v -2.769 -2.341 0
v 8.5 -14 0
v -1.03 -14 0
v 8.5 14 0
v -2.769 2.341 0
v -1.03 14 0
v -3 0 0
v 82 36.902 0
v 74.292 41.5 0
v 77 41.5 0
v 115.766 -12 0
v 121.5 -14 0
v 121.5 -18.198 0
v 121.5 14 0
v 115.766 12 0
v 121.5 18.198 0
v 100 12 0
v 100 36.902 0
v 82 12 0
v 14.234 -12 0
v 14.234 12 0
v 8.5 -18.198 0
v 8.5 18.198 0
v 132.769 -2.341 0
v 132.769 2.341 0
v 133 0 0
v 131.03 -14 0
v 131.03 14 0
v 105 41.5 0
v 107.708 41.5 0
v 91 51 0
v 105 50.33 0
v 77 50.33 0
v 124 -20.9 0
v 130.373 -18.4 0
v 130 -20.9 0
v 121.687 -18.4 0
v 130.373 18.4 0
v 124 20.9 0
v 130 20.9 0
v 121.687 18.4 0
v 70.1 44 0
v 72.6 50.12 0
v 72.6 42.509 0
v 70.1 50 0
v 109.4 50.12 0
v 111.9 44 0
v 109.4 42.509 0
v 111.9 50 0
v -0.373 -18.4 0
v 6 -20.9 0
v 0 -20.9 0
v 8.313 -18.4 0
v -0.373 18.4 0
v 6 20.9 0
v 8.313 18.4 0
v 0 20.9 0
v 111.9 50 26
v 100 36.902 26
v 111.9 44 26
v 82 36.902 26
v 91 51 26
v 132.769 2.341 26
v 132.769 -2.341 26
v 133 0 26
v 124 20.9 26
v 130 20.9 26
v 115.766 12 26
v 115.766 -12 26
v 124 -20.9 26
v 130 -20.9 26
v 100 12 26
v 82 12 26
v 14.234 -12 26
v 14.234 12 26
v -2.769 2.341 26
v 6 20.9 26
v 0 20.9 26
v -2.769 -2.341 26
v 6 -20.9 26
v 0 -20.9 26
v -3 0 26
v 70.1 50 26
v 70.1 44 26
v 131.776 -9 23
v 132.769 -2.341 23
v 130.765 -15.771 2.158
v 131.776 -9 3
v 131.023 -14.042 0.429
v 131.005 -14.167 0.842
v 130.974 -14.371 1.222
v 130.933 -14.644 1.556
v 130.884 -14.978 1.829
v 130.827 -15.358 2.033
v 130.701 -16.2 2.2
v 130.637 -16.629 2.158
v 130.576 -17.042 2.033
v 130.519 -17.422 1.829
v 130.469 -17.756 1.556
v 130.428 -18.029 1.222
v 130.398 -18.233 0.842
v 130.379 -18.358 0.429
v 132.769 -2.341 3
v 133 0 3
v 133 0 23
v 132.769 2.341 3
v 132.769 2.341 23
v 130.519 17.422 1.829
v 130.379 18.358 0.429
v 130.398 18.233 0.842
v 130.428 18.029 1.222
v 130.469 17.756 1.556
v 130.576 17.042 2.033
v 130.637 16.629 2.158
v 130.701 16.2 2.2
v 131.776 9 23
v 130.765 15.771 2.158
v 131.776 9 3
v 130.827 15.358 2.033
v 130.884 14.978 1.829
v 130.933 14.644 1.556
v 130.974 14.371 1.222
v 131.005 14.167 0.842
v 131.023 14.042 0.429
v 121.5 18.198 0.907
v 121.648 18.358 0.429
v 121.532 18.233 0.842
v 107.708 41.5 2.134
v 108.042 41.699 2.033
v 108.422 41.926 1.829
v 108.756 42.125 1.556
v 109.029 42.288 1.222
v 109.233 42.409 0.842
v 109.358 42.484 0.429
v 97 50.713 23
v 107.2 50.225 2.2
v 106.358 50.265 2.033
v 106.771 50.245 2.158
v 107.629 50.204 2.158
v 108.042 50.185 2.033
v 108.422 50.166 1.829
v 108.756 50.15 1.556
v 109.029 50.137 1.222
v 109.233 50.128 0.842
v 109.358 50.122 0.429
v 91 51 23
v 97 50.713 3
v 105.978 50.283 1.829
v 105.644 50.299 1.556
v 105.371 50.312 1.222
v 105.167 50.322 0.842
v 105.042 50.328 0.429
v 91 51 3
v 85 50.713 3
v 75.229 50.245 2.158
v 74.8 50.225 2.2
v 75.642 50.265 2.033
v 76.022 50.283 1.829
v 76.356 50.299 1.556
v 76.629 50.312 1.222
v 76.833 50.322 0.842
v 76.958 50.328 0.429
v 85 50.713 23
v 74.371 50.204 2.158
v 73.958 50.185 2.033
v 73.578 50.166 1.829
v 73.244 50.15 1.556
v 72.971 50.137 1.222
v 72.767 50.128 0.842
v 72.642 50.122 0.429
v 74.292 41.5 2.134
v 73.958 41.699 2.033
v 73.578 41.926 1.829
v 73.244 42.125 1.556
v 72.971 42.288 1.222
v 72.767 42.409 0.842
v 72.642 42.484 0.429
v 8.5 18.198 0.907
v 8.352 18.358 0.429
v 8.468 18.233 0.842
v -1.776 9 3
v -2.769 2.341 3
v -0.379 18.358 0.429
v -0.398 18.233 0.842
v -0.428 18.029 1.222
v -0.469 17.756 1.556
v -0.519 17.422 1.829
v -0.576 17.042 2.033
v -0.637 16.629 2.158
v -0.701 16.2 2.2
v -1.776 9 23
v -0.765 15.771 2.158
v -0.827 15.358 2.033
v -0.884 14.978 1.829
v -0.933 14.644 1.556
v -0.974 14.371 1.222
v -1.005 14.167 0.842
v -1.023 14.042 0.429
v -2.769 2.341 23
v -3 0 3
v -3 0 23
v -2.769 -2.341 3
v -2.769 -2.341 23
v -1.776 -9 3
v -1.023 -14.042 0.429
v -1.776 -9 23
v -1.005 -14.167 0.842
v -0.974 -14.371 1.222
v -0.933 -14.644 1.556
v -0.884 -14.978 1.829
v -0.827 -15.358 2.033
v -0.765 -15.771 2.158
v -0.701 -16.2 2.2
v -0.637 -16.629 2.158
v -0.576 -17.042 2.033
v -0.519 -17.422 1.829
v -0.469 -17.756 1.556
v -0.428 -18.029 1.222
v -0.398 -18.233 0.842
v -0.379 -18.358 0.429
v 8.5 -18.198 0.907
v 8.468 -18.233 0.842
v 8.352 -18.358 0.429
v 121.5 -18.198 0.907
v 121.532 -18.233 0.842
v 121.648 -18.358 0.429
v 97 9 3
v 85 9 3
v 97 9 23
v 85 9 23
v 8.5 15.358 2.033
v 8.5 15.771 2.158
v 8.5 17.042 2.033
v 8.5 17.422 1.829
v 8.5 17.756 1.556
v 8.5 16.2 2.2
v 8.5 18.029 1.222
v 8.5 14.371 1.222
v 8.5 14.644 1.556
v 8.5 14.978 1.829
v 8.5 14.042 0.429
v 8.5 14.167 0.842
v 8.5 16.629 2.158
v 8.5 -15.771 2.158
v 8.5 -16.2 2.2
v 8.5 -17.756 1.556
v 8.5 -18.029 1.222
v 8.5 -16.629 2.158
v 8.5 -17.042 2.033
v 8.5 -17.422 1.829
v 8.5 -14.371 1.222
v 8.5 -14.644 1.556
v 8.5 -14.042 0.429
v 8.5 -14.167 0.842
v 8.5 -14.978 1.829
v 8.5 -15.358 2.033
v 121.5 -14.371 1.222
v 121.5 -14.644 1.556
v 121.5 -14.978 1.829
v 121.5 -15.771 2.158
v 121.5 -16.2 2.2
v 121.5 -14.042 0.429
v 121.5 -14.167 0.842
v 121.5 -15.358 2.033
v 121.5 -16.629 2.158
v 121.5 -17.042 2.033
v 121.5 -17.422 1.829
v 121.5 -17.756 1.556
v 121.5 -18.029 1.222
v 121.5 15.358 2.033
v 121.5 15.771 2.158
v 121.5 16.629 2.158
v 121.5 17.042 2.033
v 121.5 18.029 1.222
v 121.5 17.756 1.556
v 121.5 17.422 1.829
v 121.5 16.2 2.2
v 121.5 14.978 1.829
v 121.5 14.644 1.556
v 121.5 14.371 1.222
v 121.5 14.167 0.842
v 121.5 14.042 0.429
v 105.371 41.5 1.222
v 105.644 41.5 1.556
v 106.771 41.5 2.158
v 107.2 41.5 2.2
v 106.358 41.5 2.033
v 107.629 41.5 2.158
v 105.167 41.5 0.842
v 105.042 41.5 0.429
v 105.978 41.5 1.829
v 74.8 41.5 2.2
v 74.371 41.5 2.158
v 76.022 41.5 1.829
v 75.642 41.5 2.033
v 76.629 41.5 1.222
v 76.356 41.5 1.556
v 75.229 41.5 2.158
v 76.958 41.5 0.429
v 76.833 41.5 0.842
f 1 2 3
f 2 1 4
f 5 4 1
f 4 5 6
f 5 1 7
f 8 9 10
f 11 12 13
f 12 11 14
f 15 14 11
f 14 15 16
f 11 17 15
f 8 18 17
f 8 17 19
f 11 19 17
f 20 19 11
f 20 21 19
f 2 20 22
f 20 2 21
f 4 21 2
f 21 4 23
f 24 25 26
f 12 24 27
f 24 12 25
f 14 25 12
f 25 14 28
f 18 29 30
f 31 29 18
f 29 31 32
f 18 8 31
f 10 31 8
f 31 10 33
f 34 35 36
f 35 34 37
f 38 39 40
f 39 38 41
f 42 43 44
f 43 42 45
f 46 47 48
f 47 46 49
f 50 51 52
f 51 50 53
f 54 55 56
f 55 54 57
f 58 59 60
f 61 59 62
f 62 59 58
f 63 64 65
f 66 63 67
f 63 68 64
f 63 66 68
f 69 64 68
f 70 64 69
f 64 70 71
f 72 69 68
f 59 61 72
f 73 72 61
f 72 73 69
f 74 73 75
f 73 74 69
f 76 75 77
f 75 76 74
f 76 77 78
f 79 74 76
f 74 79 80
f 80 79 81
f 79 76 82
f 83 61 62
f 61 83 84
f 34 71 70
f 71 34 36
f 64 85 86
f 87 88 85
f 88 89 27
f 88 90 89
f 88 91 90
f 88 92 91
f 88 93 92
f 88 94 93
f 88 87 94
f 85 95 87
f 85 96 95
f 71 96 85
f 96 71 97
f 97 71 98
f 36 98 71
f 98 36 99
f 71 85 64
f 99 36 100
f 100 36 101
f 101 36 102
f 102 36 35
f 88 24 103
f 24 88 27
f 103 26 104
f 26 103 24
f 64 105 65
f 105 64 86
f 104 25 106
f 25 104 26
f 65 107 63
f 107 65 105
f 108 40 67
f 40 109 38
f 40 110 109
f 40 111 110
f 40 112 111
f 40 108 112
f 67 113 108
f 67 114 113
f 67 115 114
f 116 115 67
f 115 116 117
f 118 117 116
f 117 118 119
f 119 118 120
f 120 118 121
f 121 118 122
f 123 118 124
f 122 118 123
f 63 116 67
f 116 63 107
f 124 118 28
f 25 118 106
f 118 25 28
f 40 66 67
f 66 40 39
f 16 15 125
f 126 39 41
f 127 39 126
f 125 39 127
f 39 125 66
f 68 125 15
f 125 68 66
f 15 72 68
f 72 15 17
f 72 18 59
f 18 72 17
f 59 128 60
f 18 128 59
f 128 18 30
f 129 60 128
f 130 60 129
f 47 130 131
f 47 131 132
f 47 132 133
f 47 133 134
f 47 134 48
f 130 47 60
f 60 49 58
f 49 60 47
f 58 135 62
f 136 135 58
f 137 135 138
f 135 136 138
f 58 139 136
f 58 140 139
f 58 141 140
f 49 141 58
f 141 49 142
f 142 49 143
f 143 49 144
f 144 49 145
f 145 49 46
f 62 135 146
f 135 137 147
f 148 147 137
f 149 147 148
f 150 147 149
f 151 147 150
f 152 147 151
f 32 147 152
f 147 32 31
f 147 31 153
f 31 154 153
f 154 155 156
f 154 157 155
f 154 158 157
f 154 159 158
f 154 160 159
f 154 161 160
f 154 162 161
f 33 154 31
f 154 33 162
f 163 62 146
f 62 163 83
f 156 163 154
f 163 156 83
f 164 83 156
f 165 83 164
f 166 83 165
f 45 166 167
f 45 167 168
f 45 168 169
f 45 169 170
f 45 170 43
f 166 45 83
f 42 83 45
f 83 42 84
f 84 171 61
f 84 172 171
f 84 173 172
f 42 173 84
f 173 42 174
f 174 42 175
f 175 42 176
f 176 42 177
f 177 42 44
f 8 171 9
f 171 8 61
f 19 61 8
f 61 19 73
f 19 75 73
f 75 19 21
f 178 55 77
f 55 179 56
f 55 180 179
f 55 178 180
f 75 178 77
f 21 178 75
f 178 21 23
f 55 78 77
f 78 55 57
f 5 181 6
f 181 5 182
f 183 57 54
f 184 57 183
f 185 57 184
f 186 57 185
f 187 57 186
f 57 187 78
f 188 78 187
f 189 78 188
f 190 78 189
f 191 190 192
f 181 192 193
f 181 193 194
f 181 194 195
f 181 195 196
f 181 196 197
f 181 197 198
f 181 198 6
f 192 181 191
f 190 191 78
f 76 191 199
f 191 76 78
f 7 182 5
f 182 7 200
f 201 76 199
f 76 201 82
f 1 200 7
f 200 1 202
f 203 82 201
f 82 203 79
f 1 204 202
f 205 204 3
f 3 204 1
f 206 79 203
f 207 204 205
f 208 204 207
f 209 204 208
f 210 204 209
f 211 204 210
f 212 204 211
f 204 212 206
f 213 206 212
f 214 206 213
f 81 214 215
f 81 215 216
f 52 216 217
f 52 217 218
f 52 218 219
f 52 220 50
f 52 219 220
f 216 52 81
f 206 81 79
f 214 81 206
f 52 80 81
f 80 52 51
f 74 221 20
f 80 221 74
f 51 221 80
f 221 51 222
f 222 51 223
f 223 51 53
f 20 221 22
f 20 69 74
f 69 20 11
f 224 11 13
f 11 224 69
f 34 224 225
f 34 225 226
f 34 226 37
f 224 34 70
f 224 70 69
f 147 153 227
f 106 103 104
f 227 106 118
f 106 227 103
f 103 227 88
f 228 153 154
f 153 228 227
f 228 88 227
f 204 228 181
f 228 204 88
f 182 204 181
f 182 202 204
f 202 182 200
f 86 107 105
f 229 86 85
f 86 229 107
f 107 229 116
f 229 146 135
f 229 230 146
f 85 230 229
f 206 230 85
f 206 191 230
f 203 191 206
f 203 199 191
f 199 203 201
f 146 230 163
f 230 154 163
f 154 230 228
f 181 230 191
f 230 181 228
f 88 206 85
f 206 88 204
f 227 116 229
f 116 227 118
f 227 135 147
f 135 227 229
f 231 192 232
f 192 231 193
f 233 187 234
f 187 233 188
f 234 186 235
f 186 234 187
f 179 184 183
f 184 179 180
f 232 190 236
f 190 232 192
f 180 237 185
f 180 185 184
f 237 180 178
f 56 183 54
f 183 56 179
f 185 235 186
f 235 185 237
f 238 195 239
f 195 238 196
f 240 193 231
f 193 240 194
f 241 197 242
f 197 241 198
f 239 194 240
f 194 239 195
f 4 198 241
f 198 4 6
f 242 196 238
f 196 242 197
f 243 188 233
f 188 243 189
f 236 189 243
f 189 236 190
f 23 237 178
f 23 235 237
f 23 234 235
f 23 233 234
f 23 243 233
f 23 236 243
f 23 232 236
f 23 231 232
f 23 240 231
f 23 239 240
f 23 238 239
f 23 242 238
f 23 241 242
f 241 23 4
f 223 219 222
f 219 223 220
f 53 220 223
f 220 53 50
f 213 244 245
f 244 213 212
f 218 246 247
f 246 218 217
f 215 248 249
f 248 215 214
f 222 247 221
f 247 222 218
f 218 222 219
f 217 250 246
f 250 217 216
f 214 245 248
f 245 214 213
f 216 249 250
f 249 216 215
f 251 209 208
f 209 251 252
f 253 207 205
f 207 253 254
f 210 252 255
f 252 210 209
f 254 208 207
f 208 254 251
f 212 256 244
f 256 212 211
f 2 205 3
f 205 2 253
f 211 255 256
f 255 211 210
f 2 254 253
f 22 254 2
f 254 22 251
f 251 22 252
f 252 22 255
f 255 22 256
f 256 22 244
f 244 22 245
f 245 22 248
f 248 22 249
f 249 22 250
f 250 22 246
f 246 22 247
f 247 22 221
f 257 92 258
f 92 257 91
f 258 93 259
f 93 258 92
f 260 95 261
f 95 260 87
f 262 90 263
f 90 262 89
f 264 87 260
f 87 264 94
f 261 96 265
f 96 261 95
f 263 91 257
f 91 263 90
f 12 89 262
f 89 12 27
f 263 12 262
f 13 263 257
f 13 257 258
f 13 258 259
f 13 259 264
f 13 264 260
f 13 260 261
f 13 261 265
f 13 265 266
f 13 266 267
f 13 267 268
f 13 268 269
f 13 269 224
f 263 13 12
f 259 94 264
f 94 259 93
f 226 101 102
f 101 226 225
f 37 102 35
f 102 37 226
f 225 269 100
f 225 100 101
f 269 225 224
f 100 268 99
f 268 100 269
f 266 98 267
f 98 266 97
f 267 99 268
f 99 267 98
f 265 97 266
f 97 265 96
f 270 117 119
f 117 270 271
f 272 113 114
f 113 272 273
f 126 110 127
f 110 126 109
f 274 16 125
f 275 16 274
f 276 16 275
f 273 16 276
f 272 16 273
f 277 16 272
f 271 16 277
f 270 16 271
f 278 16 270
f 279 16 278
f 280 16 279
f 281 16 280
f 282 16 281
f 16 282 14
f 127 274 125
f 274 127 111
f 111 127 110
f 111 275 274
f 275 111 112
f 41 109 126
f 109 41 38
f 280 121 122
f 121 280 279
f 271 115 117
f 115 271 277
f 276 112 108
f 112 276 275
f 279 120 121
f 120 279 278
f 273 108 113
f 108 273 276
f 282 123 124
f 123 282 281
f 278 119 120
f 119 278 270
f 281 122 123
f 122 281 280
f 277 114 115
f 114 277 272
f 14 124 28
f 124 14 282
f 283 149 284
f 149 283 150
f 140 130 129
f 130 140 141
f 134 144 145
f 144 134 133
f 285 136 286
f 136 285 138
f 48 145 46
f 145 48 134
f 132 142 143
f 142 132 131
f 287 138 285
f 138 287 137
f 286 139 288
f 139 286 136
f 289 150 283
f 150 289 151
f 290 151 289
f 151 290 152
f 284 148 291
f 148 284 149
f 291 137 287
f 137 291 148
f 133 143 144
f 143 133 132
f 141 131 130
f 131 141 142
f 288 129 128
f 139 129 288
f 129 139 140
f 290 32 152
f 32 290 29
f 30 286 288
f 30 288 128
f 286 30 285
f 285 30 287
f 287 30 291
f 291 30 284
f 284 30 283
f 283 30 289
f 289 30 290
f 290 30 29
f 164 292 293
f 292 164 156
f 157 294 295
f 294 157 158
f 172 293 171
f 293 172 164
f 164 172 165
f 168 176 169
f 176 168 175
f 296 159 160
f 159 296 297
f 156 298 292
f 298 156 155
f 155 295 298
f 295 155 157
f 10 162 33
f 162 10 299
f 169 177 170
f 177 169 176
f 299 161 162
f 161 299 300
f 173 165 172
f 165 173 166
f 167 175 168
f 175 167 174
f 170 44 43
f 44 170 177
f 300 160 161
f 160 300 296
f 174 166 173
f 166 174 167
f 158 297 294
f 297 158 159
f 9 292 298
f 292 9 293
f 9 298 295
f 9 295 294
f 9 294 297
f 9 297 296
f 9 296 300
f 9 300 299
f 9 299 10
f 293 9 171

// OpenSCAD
$fn = 32;

// ----------------------------------------------------------------------
// Air duct: 24 mm duct, 3 mm wall, 26 mm across
// ----------------------------------------------------------------------

// --- parameters (mm) ---
duct_r = 12;              // duct core radius
duct_d = 24;              // duct core diameter
wall = 3;                 // duct wall thickness
height = 26;              // duct width (extrusion height)
port_r = 20.9;            // port flange half width
port_d = 41.8;            // port flange width
port_t = 6;               // port flange thickness
bolt_d = 4.4;             // port bolt holes
bolt_offset = 16.2;       // bolt hole offset from the port axis
branch_r = 9;             // branch core radius
branch_d = 18;            // branch core diameter
branch_len = 50;          // branch length from the run axis

difference() {
  /* outer hull chain: tube with a flat flange plate at every port */
  linear_extrude(height = 26) {
    hull() {
      polygon([[0, -20.9], [0, 20.9], [6, 20.9], [6, -20.9]]);
      translate([9, 0]) circle(r = 12);
    }
    hull() {
      translate([9, 0]) circle(r = 12);
      translate([39, 0]) circle(r = 12);
    }
    hull() {
      translate([39, 0]) circle(r = 12);
      translate([91, 0]) circle(r = 12);
    }
    hull() {
      translate([91, 0]) circle(r = 12);
      translate([121, 0]) circle(r = 12);
    }
    hull() {
      translate([121, 0]) circle(r = 12);
      polygon([[130, 20.9], [130, -20.9], [124, -20.9], [124, 20.9]]);
    }
    hull() {
      translate([91, 0]) circle(r = 9);
      translate([91, 27.5]) circle(r = 9);
    }
    hull() {
      translate([91, 27.5]) circle(r = 9);
      translate([91, 42]) circle(r = 9);
    }
    hull() {
      translate([91, 42]) circle(r = 9);
      polygon([[70.1, 50], [111.9, 50], [111.9, 44], [70.1, 44]]);
    }
  }
  /* air passage: the same chain inset by the wall, 5 mm proud of the ports */
  translate([0, 0, 3]) linear_extrude(height = 20) {
    hull() {
      translate([-5, 0]) circle(r = 9);
      translate([39, 0]) circle(r = 9);
    }
    hull() {
      translate([39, 0]) circle(r = 9);
      translate([91, 0]) circle(r = 9);
    }
    hull() {
      translate([91, 0]) circle(r = 9);
      translate([135, 0]) circle(r = 9);
    }
    hull() {
      translate([91, 0]) circle(r = 6);
      translate([91, 27.5]) circle(r = 6);
    }
    hull() {
      translate([91, 27.5]) circle(r = 6);
      translate([91, 55]) circle(r = 6);
    }
  }
  translate([0, 0]) rotate([0, 0, -90]) translate([-16.2, -2.5]) rotate([-90, 0, 0]) cylinder(h = 11, d = 4.4);
  translate([0, 0]) rotate([0, 0, -90]) translate([16.2, -2.5]) rotate([-90, 0, 0]) cylinder(h = 11, d = 4.4);
  translate([130, 0]) rotate([0, 0, 90]) translate([-16.2, -2.5]) rotate([-90, 0, 0]) cylinder(h = 11, d = 4.4);
  translate([130, 0]) rotate([0, 0, 90]) translate([16.2, -2.5]) rotate([-90, 0, 0]) cylinder(h = 11, d = 4.4);
  translate([91, 50]) rotate([0, 0, 180]) translate([-16.2, -2.5]) rotate([-90, 0, 0]) cylinder(h = 11, d = 4.4);
  translate([91, 50]) rotate([0, 0, 180]) translate([16.2, -2.5]) rotate([-90, 0, 0]) cylinder(h = 11, d = 4.4);
}
